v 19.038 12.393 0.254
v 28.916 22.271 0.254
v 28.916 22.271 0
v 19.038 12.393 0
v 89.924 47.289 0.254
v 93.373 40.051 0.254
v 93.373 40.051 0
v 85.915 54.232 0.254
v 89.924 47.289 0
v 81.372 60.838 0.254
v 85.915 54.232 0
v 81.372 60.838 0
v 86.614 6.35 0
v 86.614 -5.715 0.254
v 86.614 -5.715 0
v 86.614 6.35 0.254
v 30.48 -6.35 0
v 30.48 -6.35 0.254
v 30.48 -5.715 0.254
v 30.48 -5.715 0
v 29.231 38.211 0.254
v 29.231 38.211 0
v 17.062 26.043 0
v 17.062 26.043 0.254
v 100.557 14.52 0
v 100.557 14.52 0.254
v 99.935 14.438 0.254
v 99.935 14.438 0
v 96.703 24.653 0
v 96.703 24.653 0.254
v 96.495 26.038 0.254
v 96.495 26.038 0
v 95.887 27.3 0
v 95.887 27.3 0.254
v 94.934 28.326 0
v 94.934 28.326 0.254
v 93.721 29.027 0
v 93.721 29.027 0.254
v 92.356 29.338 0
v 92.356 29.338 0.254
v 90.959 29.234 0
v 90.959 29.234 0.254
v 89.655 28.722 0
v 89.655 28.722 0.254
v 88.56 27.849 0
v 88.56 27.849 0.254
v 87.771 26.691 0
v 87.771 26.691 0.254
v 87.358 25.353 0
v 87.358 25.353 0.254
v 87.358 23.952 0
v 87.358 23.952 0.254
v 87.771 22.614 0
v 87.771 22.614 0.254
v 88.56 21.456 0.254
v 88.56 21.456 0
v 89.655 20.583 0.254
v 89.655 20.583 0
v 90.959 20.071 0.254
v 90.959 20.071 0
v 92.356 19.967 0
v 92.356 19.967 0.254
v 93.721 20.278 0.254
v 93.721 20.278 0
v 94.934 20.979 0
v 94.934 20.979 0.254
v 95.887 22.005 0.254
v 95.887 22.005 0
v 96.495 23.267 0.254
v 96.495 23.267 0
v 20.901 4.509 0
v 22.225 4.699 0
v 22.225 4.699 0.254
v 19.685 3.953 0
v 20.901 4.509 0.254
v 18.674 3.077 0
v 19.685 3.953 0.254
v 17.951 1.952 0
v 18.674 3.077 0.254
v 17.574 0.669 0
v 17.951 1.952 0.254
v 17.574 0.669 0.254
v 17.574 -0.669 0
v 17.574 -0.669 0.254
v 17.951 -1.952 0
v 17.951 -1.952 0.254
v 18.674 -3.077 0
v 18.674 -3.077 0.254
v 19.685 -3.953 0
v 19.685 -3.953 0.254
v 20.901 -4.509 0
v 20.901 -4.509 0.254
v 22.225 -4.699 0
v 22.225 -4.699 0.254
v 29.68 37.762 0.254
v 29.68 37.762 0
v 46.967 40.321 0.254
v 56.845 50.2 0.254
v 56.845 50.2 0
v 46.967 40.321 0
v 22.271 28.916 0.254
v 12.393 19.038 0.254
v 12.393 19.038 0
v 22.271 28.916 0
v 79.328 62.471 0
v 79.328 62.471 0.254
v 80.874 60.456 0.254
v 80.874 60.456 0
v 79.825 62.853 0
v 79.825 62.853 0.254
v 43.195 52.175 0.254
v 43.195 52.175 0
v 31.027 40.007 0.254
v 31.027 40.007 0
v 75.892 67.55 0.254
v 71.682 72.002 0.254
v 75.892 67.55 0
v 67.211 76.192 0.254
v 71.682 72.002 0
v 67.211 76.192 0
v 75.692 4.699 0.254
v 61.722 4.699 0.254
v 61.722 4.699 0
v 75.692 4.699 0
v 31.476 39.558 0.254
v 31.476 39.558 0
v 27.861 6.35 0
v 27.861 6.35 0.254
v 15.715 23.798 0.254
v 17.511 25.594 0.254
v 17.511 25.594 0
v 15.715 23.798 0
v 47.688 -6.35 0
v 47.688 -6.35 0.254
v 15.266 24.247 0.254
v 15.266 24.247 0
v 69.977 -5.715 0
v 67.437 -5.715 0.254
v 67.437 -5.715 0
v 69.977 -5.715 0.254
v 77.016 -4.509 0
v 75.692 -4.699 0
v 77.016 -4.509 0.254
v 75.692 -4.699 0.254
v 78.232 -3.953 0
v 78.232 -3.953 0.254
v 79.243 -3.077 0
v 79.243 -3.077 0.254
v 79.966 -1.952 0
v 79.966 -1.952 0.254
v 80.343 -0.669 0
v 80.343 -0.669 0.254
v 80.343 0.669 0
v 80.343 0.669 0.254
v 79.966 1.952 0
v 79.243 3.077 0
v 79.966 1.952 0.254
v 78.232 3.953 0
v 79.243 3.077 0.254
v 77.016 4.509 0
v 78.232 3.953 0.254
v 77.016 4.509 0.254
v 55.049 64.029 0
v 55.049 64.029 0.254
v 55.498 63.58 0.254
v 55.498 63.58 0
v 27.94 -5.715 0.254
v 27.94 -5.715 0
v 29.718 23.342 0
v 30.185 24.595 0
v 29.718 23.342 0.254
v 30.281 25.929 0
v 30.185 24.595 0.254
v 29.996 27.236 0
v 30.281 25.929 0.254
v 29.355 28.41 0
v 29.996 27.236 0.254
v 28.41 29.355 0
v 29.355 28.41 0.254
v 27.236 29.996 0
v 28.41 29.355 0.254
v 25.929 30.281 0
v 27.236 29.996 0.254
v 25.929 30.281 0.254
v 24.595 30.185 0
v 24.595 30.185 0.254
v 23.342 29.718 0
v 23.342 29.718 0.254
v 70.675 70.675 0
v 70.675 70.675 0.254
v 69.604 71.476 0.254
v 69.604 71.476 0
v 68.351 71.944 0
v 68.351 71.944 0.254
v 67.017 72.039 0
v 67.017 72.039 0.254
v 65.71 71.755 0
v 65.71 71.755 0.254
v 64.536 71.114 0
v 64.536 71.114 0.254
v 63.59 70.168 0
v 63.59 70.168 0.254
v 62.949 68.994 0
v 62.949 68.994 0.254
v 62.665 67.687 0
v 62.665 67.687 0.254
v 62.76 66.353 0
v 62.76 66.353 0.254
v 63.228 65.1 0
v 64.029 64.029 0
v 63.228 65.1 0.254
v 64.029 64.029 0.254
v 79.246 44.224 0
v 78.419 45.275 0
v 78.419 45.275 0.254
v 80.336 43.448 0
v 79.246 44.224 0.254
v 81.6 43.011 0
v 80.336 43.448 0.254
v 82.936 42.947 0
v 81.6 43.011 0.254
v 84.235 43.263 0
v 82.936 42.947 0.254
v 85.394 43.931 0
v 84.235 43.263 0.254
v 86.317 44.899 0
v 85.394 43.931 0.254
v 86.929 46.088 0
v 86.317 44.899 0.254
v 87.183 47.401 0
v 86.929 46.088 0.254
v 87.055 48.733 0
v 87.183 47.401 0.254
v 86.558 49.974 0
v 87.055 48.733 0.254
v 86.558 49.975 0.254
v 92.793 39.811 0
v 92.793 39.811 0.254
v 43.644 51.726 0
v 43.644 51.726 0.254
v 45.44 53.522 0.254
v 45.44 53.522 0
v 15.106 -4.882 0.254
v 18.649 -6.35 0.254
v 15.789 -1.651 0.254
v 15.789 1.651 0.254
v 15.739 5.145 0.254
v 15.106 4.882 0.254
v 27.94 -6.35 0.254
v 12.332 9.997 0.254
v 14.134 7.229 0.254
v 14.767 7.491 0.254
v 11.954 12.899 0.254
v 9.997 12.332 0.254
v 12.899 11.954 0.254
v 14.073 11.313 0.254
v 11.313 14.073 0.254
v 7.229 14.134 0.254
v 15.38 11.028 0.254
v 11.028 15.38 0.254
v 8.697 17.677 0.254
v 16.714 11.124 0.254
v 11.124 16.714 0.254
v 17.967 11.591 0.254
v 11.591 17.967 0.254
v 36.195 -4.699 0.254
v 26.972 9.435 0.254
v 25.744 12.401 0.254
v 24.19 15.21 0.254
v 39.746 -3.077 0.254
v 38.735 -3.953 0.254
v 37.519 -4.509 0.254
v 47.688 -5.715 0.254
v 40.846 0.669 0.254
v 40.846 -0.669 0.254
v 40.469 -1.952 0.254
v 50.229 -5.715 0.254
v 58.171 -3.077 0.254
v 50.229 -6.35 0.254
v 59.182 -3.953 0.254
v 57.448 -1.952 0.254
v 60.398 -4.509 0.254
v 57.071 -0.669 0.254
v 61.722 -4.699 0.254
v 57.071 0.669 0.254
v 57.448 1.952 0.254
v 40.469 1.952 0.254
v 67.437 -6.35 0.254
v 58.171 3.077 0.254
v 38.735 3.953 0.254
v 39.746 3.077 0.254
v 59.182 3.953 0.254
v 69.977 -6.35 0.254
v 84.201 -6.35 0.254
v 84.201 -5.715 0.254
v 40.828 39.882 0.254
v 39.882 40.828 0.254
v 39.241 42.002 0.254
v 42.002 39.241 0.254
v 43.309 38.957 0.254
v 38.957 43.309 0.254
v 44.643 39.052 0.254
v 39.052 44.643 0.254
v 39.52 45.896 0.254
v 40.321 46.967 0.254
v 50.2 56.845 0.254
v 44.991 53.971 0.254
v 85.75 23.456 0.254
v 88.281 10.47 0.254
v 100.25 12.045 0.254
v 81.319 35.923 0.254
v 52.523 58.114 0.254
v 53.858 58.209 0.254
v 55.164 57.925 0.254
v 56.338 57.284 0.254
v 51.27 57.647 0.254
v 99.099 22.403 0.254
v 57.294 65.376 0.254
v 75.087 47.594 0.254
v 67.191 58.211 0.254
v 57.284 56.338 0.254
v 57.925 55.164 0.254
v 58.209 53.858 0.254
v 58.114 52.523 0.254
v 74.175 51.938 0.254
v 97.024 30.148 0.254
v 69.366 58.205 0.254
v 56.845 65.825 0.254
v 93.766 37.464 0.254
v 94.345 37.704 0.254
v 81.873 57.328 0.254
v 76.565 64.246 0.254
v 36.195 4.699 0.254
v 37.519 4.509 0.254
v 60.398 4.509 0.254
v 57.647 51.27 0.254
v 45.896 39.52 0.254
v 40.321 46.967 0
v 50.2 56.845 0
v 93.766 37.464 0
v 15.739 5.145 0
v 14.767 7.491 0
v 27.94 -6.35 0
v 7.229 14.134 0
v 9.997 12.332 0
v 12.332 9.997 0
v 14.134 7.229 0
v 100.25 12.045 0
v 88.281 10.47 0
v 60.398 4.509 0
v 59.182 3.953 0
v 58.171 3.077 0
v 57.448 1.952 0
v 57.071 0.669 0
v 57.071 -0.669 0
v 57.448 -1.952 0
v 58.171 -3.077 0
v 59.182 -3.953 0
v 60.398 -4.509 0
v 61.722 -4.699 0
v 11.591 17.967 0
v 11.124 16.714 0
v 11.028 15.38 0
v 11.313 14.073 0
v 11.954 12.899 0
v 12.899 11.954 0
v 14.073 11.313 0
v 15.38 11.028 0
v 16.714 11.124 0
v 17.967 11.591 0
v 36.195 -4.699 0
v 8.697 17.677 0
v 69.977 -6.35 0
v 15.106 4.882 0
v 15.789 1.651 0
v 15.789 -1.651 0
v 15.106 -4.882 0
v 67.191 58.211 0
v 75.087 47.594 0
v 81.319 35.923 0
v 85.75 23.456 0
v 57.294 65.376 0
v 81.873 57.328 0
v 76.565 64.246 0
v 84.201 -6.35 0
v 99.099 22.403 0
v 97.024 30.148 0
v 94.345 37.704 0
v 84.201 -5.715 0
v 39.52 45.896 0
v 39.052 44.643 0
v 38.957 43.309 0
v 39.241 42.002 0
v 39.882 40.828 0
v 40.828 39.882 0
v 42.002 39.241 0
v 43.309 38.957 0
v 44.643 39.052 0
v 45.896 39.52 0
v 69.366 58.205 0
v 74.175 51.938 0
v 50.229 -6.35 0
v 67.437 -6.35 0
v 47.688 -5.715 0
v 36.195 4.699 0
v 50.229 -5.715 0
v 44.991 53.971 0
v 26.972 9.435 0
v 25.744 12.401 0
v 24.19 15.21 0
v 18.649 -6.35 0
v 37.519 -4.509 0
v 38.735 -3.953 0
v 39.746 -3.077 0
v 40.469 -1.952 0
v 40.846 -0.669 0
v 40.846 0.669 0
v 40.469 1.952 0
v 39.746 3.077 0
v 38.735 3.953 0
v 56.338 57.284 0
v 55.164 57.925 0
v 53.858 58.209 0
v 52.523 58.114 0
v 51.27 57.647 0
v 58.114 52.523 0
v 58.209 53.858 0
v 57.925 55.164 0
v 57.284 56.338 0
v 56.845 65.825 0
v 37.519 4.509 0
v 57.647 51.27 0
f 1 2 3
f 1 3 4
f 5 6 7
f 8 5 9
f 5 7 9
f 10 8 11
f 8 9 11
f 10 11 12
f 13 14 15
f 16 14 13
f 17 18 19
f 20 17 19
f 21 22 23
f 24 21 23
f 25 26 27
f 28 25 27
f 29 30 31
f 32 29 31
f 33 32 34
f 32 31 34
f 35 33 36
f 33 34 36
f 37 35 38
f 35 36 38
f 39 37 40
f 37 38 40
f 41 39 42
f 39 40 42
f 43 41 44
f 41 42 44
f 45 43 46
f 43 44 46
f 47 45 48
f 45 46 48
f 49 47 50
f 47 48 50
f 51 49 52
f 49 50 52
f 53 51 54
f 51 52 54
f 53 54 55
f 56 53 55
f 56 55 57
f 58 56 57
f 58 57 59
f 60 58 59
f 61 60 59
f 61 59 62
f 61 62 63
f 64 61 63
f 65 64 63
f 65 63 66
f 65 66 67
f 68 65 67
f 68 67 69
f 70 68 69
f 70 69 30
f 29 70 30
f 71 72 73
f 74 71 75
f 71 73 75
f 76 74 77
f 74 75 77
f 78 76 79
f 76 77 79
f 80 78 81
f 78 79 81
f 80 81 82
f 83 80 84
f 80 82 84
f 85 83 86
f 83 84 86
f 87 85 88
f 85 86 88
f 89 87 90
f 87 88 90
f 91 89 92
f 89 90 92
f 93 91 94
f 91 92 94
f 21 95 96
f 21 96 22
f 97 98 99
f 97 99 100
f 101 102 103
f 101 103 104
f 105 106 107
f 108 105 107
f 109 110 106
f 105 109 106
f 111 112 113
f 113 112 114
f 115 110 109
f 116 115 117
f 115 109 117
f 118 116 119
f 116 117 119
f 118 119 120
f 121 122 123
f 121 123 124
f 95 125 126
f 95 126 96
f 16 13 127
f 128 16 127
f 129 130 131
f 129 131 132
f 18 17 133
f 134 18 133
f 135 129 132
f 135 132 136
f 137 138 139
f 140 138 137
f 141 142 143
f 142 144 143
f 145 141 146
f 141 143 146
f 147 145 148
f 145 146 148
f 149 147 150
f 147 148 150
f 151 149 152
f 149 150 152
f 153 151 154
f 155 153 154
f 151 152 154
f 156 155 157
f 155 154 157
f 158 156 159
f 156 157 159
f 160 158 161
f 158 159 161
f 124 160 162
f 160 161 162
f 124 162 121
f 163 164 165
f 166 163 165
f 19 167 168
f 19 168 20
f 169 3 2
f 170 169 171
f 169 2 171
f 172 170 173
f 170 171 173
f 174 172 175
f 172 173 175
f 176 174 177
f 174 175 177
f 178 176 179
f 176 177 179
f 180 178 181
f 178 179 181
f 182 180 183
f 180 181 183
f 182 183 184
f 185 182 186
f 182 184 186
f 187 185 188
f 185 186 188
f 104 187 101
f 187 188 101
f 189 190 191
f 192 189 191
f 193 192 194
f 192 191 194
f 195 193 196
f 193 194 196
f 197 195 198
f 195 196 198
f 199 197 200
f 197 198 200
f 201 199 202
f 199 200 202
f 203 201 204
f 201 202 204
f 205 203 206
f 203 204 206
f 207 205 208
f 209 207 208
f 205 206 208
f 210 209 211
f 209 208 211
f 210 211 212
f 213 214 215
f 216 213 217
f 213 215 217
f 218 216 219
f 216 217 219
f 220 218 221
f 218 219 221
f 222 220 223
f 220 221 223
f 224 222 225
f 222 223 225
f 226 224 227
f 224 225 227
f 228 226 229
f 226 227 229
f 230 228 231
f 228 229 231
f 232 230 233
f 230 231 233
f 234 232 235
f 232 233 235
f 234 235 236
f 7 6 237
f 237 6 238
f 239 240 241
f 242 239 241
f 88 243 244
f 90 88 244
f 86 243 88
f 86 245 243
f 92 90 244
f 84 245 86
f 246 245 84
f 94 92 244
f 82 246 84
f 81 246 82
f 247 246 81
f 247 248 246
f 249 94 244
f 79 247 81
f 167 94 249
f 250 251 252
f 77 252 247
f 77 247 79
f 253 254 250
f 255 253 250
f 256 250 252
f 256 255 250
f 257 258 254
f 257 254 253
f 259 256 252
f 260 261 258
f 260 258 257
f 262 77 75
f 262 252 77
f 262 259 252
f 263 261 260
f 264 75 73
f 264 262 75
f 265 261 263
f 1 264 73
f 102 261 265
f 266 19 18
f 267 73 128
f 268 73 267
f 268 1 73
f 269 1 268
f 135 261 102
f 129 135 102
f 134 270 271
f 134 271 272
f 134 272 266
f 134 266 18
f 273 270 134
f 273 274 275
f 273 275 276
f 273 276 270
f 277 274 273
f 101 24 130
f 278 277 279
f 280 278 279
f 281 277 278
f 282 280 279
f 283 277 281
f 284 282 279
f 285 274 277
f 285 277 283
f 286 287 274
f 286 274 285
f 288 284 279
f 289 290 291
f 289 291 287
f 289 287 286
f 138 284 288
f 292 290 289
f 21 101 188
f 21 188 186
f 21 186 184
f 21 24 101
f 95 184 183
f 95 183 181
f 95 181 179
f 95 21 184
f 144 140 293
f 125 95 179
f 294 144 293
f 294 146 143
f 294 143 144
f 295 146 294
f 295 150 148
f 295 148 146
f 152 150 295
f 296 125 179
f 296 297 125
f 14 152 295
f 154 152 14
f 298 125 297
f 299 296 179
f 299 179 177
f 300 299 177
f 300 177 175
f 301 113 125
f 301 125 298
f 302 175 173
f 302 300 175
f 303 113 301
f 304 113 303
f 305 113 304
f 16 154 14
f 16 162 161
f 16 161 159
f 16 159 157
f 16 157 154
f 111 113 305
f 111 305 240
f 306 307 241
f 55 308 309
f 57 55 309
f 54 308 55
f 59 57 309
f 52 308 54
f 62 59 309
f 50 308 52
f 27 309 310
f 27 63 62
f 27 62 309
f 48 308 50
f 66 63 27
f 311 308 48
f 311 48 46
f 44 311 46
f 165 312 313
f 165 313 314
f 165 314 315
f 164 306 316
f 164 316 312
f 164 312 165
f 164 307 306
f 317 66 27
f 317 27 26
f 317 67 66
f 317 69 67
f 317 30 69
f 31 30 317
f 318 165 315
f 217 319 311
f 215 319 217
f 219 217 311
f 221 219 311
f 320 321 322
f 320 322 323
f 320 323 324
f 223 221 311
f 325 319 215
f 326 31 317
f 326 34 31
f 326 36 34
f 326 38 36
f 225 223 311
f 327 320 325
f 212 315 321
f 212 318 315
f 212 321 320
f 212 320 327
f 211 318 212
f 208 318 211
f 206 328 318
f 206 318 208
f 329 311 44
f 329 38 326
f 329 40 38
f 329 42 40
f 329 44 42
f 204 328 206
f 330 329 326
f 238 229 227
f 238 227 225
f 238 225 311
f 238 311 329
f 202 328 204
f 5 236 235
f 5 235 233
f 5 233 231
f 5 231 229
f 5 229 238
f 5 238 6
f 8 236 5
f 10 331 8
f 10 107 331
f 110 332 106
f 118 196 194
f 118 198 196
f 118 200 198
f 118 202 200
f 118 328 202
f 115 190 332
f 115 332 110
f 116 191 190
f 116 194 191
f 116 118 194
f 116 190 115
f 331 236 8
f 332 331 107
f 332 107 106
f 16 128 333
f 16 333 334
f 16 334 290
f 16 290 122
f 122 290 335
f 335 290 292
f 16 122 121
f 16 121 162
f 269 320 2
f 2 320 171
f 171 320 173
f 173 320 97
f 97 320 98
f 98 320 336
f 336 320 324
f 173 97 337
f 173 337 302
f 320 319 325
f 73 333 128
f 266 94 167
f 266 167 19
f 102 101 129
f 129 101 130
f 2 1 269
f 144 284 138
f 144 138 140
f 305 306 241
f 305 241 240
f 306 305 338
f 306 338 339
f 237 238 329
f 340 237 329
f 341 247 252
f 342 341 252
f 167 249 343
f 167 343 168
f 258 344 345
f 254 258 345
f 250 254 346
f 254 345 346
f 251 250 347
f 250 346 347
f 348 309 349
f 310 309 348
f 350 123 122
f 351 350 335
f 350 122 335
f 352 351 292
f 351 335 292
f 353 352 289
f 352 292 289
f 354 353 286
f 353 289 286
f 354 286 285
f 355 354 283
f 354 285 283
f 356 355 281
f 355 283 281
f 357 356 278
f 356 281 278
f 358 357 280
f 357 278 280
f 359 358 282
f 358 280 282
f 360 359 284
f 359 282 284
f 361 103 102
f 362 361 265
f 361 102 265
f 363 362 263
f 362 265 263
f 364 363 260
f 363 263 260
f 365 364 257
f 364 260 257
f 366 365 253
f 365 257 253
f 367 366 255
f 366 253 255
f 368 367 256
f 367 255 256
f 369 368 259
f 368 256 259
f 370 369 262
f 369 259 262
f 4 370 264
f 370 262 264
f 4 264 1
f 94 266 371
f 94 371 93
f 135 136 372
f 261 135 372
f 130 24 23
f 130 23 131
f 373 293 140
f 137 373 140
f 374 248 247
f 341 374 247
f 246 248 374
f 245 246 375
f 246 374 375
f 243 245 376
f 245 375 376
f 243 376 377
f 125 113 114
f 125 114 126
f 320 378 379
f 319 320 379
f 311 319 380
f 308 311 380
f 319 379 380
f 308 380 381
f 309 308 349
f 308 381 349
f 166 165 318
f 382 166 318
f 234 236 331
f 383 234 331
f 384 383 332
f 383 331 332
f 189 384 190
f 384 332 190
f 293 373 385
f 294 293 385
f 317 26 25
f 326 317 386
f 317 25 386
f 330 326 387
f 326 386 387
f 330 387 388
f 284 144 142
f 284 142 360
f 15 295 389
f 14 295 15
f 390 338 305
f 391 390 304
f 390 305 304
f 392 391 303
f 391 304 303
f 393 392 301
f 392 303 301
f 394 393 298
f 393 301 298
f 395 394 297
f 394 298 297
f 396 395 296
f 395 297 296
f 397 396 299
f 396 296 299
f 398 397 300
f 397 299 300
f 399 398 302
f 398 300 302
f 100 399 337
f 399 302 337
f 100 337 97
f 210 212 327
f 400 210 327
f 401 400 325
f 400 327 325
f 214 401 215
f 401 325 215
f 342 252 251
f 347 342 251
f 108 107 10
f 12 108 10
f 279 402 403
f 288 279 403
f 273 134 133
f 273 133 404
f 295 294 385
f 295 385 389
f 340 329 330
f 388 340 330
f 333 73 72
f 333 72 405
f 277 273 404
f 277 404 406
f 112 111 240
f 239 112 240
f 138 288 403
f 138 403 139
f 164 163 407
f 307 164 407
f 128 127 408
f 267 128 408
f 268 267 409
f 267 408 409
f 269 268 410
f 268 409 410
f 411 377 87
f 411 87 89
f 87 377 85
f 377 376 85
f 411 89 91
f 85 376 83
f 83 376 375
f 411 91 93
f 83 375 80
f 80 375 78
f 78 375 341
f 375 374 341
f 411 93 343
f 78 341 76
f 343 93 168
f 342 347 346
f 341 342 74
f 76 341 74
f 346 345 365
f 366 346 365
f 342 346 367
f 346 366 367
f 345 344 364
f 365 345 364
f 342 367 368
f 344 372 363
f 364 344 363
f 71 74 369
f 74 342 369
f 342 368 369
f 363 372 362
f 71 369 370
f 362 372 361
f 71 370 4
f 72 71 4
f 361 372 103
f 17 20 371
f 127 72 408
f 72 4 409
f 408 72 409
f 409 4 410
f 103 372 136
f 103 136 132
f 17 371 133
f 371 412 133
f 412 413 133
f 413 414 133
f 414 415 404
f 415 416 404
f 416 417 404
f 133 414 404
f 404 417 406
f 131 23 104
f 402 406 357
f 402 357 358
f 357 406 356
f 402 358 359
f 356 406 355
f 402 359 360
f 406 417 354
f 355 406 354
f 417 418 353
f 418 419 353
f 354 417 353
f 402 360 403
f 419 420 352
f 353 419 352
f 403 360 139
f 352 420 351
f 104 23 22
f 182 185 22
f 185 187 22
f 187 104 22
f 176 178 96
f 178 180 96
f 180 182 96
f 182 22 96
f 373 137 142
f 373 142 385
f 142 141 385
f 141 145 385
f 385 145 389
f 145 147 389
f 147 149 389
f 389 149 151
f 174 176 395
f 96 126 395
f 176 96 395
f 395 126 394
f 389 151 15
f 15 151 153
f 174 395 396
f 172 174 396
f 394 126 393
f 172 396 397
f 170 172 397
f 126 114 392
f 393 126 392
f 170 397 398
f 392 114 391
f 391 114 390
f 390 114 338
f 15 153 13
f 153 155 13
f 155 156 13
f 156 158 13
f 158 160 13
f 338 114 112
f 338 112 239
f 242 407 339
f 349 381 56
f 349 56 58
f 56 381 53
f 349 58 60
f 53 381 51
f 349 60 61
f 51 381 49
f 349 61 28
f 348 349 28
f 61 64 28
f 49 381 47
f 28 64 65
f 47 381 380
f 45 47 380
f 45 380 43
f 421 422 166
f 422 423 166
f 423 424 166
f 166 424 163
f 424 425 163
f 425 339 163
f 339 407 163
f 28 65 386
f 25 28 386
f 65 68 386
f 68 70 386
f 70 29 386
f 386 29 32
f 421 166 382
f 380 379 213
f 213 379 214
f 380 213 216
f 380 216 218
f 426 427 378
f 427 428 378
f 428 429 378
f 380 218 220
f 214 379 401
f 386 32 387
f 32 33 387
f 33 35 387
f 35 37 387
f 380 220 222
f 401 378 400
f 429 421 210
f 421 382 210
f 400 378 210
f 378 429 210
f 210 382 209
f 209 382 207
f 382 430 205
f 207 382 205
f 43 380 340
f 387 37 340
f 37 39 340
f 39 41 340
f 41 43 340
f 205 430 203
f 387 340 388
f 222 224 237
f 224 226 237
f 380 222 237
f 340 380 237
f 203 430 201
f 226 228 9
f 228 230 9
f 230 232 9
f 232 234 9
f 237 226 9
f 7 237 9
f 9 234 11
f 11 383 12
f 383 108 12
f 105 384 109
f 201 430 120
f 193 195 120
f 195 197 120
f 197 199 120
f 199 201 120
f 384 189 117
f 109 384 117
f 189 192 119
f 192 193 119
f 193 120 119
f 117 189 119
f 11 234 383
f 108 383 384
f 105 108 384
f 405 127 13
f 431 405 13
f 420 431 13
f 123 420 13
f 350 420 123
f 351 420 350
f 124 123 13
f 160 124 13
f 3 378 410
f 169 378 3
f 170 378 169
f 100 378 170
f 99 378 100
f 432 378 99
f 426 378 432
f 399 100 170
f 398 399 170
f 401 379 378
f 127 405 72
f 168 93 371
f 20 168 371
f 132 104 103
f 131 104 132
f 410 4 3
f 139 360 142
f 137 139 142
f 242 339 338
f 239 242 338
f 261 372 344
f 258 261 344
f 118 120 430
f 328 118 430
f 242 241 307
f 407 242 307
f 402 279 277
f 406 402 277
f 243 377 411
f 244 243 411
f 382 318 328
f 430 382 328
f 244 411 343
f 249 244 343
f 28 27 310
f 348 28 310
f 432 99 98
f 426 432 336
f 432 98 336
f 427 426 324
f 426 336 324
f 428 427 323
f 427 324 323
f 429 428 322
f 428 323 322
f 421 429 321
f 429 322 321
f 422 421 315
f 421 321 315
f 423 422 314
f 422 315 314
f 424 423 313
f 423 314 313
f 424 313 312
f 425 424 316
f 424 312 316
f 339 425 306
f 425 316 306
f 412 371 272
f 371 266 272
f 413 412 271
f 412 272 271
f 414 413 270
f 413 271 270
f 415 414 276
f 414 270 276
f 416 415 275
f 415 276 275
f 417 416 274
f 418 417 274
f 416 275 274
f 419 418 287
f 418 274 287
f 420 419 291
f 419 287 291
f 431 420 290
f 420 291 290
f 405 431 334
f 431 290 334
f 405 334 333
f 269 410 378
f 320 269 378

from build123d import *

# Parameters (mm, degrees)
BOSS_EXTRUDE1_DEPTH = 0.254
SKETCH2_R           = 4.699
CUT_EXTRUDE1_DEPTH  = 1.254
SKETCH3_W           = 2.54
SKETCH3_H           = 0.635
CUT_EXTRUDE2_DEPTH  = 1.254
CUT_EXTRUDE4_DEPTH  = 1.254
CUT_EXTRUDE5_DEPTH  = 1.254


with BuildPart() as part:
    # Sketch1 → Boss-Extrude1 (new body)
    with BuildSketch(Plane.XY):
        with BuildLine():
            Line((67.21146711, 76.191723231), (8.696654013, 17.676910134))
            Line((8.696654013, 17.676910134), (7.228954972, 14.133571205))
            ThreePointArc((7.228954972, 14.133571205), (14.666587579, 6.075099489), (15.105587123, -4.88230096))
            Line((15.105587123, -4.88230096), (18.648926052, -6.35))
            Line((18.648926052, -6.35), (101.401368334, -6.35))
            ThreePointArc((101.401368334, -6.35), (93.866160503, 38.880636728), (67.21146711, 76.191723231))
        make_face()
        with BuildLine():
            Line((88.672924278, 6.35), (27.86051193, 6.35))
            ThreePointArc((27.86051193, 6.35), (26.399857642, 10.93517908), (24.190484974, 15.210228852))
            Line((24.190484974, 15.210228852), (67.191354125, 58.211098004))
            ThreePointArc((67.191354125, 58.211098004), (82.13289044, 34.020557137), (88.672924278, 6.35))
        make_face(mode=Mode.SUBTRACT)
    extrude(amount=BOSS_EXTRUDE1_DEPTH)

    # Sketch2 → Cut-Extrude1 (cut, through all)
    with BuildSketch(Plane.XY.offset(0.254)):
        with Locations((22.225, 0)):
            Circle(SKETCH2_R)
        with Locations((36.195, 0)):
            Circle(SKETCH2_R)
        with Locations((61.722, 0)):
            Circle(SKETCH2_R)
        with Locations((75.692, 0)):
            Circle(SKETCH2_R)
        with Locations((95.25, 0)):
            Circle(SKETCH2_R)
        with Locations((15.715448212, 15.715448212)):
            Circle(SKETCH2_R)
        with Locations((25.593729945, 25.593729945)):
            Circle(SKETCH2_R)
        with Locations((43.644044748, 43.644044748)):
            Circle(SKETCH2_R)
        with Locations((53.522326482, 53.522326482)):
            Circle(SKETCH2_R)
        with Locations((92.004434954, 24.652514046)):
            Circle(SKETCH2_R)
        with Locations((82.48891971, 47.625)):
            Circle(SKETCH2_R)
        with Locations((67.351920908, 67.351920908)):
            Circle(SKETCH2_R)
    extrude(amount=-CUT_EXTRUDE1_DEPTH, mode=Mode.SUBTRACT)

    # Sketch3 → Cut-Extrude2 (cut, through all)
    with BuildSketch(Plane.XY.offset(0.254)):
        Polygon((15.266435406, 24.246691527), (17.06248663, 26.042742751), (17.511499436, 25.593729945), (15.715448212, 23.797678721), align=None)
        Polygon((44.991083167, 53.971339288), (43.195031942, 52.175288063), (43.644044748, 51.726275257), (45.440095973, 53.522326482), align=None)
        with Locations((29.21, -6.0325)):
            Rectangle(SKETCH3_W, SKETCH3_H)
        with Locations((68.707, -6.0325)):
            Rectangle(SKETCH3_W, SKETCH3_H)
        Polygon((29.230733674, 38.210989795), (31.026784898, 40.007041019), (31.475797704, 39.558028213), (29.67974648, 37.761976989), align=None)
        Polygon((56.845021246, 65.825277367), (55.048970022, 64.029226143), (55.497982828, 63.580213337), (57.294034052, 65.376264561), align=None)
        with Locations((48.9585, -6.0325)):
            Rectangle(SKETCH3_W, SKETCH3_H)
        with Locations((85.471, -6.0325)):
            Rectangle(SKETCH3_W, SKETCH3_H)
        Polygon((99.935462164, 14.437711971), (100.266998693, 11.919442024), (101.526133667, 12.085210288), (101.194597138, 14.603480236), align=None)
        Polygon((93.765504959, 37.464305742), (94.938831965, 37.950313702), (93.966816047, 40.296967714), (92.793489041, 39.810959755), align=None)
        Polygon((79.327792988, 62.471156422), (80.874047017, 60.456038938), (81.88160576, 61.229165953), (80.33535173, 63.244283437), align=None)
        Polygon((13.593916116, 7.005422516), (14.565932035, 4.658768503), (15.739259041, 5.144776462), (14.767243123, 7.491430475), align=None)
    extrude(amount=-CUT_EXTRUDE2_DEPTH, mode=Mode.SUBTRACT)

    # Sketch6 → Cut-Extrude4 (cut, through all)
    with BuildSketch(Plane.XY.offset(0.254)):
        with BuildLine():
            Line((12.392753447, 19.038142977), (22.27103518, 28.91642471))
            ThreePointArc((22.27103518, 28.91642471), (28.91642471, 28.91642471), (28.91642471, 22.27103518))
            Line((28.91642471, 22.27103518), (19.038142977, 12.392753447))
            ThreePointArc((19.038142977, 12.392753447), (12.392753447, 12.392753447), (12.392753447, 19.038142977))
        make_face()
        with BuildLine():
            Line((40.321349984, 46.966739513), (50.199631717, 56.845021246))
            ThreePointArc((50.199631717, 56.845021246), (56.845021246, 56.845021246), (56.845021246, 50.199631717))
            Line((56.845021246, 50.199631717), (46.966739513, 40.321349984))
            ThreePointArc((46.966739513, 40.321349984), (40.321349984, 40.321349984), (40.321349984, 46.966739513))
        make_face()
        with BuildLine():
            Line((22.225, 4.699), (36.195, 4.699))
            ThreePointArc((36.195, 4.699), (40.894, 0), (36.195, -4.699))
            Line((36.195, -4.699), (22.225, -4.699))
            ThreePointArc((22.225, -4.699), (17.526, 0), (22.225, 4.699))
        make_face()
        with BuildLine():
            Line((61.722, 4.699), (75.692, 4.699))
            ThreePointArc((75.692, 4.699), (80.391, 0), (75.692, -4.699))
            Line((75.692, -4.699), (61.722, -4.699))
            ThreePointArc((61.722, -4.699), (57.023, 0), (61.722, 4.699))
        make_face()
        with BuildLine():
            ThreePointArc((86.558373083, 49.9745), (79.294873009, 60.845096068), (70.674615673, 70.674615673))
            ThreePointArc((70.674615673, 70.674615673), (64.029226143, 70.674615673), (64.029226143, 64.029226143))
            ThreePointArc((64.029226143, 64.029226143), (71.838938317, 55.123956158), (78.419466338, 45.2755))
            ThreePointArc((78.419466338, 45.2755), (84.83841971, 43.555546628), (86.558373083, 49.9745))
        make_face()
    extrude(amount=-CUT_EXTRUDE4_DEPTH, mode=Mode.SUBTRACT)

    # Sketch5 → Cut-Extrude5 (cut, through all)
    with BuildSketch(Plane.XY.offset(0.254)):
        Polygon((86.614, -7.62), (86.614, 10.250086524), (102.87, 12.390229525), (102.87, -7.62), align=None)
    extrude(amount=-CUT_EXTRUDE5_DEPTH, mode=Mode.SUBTRACT)


solid = part.part
